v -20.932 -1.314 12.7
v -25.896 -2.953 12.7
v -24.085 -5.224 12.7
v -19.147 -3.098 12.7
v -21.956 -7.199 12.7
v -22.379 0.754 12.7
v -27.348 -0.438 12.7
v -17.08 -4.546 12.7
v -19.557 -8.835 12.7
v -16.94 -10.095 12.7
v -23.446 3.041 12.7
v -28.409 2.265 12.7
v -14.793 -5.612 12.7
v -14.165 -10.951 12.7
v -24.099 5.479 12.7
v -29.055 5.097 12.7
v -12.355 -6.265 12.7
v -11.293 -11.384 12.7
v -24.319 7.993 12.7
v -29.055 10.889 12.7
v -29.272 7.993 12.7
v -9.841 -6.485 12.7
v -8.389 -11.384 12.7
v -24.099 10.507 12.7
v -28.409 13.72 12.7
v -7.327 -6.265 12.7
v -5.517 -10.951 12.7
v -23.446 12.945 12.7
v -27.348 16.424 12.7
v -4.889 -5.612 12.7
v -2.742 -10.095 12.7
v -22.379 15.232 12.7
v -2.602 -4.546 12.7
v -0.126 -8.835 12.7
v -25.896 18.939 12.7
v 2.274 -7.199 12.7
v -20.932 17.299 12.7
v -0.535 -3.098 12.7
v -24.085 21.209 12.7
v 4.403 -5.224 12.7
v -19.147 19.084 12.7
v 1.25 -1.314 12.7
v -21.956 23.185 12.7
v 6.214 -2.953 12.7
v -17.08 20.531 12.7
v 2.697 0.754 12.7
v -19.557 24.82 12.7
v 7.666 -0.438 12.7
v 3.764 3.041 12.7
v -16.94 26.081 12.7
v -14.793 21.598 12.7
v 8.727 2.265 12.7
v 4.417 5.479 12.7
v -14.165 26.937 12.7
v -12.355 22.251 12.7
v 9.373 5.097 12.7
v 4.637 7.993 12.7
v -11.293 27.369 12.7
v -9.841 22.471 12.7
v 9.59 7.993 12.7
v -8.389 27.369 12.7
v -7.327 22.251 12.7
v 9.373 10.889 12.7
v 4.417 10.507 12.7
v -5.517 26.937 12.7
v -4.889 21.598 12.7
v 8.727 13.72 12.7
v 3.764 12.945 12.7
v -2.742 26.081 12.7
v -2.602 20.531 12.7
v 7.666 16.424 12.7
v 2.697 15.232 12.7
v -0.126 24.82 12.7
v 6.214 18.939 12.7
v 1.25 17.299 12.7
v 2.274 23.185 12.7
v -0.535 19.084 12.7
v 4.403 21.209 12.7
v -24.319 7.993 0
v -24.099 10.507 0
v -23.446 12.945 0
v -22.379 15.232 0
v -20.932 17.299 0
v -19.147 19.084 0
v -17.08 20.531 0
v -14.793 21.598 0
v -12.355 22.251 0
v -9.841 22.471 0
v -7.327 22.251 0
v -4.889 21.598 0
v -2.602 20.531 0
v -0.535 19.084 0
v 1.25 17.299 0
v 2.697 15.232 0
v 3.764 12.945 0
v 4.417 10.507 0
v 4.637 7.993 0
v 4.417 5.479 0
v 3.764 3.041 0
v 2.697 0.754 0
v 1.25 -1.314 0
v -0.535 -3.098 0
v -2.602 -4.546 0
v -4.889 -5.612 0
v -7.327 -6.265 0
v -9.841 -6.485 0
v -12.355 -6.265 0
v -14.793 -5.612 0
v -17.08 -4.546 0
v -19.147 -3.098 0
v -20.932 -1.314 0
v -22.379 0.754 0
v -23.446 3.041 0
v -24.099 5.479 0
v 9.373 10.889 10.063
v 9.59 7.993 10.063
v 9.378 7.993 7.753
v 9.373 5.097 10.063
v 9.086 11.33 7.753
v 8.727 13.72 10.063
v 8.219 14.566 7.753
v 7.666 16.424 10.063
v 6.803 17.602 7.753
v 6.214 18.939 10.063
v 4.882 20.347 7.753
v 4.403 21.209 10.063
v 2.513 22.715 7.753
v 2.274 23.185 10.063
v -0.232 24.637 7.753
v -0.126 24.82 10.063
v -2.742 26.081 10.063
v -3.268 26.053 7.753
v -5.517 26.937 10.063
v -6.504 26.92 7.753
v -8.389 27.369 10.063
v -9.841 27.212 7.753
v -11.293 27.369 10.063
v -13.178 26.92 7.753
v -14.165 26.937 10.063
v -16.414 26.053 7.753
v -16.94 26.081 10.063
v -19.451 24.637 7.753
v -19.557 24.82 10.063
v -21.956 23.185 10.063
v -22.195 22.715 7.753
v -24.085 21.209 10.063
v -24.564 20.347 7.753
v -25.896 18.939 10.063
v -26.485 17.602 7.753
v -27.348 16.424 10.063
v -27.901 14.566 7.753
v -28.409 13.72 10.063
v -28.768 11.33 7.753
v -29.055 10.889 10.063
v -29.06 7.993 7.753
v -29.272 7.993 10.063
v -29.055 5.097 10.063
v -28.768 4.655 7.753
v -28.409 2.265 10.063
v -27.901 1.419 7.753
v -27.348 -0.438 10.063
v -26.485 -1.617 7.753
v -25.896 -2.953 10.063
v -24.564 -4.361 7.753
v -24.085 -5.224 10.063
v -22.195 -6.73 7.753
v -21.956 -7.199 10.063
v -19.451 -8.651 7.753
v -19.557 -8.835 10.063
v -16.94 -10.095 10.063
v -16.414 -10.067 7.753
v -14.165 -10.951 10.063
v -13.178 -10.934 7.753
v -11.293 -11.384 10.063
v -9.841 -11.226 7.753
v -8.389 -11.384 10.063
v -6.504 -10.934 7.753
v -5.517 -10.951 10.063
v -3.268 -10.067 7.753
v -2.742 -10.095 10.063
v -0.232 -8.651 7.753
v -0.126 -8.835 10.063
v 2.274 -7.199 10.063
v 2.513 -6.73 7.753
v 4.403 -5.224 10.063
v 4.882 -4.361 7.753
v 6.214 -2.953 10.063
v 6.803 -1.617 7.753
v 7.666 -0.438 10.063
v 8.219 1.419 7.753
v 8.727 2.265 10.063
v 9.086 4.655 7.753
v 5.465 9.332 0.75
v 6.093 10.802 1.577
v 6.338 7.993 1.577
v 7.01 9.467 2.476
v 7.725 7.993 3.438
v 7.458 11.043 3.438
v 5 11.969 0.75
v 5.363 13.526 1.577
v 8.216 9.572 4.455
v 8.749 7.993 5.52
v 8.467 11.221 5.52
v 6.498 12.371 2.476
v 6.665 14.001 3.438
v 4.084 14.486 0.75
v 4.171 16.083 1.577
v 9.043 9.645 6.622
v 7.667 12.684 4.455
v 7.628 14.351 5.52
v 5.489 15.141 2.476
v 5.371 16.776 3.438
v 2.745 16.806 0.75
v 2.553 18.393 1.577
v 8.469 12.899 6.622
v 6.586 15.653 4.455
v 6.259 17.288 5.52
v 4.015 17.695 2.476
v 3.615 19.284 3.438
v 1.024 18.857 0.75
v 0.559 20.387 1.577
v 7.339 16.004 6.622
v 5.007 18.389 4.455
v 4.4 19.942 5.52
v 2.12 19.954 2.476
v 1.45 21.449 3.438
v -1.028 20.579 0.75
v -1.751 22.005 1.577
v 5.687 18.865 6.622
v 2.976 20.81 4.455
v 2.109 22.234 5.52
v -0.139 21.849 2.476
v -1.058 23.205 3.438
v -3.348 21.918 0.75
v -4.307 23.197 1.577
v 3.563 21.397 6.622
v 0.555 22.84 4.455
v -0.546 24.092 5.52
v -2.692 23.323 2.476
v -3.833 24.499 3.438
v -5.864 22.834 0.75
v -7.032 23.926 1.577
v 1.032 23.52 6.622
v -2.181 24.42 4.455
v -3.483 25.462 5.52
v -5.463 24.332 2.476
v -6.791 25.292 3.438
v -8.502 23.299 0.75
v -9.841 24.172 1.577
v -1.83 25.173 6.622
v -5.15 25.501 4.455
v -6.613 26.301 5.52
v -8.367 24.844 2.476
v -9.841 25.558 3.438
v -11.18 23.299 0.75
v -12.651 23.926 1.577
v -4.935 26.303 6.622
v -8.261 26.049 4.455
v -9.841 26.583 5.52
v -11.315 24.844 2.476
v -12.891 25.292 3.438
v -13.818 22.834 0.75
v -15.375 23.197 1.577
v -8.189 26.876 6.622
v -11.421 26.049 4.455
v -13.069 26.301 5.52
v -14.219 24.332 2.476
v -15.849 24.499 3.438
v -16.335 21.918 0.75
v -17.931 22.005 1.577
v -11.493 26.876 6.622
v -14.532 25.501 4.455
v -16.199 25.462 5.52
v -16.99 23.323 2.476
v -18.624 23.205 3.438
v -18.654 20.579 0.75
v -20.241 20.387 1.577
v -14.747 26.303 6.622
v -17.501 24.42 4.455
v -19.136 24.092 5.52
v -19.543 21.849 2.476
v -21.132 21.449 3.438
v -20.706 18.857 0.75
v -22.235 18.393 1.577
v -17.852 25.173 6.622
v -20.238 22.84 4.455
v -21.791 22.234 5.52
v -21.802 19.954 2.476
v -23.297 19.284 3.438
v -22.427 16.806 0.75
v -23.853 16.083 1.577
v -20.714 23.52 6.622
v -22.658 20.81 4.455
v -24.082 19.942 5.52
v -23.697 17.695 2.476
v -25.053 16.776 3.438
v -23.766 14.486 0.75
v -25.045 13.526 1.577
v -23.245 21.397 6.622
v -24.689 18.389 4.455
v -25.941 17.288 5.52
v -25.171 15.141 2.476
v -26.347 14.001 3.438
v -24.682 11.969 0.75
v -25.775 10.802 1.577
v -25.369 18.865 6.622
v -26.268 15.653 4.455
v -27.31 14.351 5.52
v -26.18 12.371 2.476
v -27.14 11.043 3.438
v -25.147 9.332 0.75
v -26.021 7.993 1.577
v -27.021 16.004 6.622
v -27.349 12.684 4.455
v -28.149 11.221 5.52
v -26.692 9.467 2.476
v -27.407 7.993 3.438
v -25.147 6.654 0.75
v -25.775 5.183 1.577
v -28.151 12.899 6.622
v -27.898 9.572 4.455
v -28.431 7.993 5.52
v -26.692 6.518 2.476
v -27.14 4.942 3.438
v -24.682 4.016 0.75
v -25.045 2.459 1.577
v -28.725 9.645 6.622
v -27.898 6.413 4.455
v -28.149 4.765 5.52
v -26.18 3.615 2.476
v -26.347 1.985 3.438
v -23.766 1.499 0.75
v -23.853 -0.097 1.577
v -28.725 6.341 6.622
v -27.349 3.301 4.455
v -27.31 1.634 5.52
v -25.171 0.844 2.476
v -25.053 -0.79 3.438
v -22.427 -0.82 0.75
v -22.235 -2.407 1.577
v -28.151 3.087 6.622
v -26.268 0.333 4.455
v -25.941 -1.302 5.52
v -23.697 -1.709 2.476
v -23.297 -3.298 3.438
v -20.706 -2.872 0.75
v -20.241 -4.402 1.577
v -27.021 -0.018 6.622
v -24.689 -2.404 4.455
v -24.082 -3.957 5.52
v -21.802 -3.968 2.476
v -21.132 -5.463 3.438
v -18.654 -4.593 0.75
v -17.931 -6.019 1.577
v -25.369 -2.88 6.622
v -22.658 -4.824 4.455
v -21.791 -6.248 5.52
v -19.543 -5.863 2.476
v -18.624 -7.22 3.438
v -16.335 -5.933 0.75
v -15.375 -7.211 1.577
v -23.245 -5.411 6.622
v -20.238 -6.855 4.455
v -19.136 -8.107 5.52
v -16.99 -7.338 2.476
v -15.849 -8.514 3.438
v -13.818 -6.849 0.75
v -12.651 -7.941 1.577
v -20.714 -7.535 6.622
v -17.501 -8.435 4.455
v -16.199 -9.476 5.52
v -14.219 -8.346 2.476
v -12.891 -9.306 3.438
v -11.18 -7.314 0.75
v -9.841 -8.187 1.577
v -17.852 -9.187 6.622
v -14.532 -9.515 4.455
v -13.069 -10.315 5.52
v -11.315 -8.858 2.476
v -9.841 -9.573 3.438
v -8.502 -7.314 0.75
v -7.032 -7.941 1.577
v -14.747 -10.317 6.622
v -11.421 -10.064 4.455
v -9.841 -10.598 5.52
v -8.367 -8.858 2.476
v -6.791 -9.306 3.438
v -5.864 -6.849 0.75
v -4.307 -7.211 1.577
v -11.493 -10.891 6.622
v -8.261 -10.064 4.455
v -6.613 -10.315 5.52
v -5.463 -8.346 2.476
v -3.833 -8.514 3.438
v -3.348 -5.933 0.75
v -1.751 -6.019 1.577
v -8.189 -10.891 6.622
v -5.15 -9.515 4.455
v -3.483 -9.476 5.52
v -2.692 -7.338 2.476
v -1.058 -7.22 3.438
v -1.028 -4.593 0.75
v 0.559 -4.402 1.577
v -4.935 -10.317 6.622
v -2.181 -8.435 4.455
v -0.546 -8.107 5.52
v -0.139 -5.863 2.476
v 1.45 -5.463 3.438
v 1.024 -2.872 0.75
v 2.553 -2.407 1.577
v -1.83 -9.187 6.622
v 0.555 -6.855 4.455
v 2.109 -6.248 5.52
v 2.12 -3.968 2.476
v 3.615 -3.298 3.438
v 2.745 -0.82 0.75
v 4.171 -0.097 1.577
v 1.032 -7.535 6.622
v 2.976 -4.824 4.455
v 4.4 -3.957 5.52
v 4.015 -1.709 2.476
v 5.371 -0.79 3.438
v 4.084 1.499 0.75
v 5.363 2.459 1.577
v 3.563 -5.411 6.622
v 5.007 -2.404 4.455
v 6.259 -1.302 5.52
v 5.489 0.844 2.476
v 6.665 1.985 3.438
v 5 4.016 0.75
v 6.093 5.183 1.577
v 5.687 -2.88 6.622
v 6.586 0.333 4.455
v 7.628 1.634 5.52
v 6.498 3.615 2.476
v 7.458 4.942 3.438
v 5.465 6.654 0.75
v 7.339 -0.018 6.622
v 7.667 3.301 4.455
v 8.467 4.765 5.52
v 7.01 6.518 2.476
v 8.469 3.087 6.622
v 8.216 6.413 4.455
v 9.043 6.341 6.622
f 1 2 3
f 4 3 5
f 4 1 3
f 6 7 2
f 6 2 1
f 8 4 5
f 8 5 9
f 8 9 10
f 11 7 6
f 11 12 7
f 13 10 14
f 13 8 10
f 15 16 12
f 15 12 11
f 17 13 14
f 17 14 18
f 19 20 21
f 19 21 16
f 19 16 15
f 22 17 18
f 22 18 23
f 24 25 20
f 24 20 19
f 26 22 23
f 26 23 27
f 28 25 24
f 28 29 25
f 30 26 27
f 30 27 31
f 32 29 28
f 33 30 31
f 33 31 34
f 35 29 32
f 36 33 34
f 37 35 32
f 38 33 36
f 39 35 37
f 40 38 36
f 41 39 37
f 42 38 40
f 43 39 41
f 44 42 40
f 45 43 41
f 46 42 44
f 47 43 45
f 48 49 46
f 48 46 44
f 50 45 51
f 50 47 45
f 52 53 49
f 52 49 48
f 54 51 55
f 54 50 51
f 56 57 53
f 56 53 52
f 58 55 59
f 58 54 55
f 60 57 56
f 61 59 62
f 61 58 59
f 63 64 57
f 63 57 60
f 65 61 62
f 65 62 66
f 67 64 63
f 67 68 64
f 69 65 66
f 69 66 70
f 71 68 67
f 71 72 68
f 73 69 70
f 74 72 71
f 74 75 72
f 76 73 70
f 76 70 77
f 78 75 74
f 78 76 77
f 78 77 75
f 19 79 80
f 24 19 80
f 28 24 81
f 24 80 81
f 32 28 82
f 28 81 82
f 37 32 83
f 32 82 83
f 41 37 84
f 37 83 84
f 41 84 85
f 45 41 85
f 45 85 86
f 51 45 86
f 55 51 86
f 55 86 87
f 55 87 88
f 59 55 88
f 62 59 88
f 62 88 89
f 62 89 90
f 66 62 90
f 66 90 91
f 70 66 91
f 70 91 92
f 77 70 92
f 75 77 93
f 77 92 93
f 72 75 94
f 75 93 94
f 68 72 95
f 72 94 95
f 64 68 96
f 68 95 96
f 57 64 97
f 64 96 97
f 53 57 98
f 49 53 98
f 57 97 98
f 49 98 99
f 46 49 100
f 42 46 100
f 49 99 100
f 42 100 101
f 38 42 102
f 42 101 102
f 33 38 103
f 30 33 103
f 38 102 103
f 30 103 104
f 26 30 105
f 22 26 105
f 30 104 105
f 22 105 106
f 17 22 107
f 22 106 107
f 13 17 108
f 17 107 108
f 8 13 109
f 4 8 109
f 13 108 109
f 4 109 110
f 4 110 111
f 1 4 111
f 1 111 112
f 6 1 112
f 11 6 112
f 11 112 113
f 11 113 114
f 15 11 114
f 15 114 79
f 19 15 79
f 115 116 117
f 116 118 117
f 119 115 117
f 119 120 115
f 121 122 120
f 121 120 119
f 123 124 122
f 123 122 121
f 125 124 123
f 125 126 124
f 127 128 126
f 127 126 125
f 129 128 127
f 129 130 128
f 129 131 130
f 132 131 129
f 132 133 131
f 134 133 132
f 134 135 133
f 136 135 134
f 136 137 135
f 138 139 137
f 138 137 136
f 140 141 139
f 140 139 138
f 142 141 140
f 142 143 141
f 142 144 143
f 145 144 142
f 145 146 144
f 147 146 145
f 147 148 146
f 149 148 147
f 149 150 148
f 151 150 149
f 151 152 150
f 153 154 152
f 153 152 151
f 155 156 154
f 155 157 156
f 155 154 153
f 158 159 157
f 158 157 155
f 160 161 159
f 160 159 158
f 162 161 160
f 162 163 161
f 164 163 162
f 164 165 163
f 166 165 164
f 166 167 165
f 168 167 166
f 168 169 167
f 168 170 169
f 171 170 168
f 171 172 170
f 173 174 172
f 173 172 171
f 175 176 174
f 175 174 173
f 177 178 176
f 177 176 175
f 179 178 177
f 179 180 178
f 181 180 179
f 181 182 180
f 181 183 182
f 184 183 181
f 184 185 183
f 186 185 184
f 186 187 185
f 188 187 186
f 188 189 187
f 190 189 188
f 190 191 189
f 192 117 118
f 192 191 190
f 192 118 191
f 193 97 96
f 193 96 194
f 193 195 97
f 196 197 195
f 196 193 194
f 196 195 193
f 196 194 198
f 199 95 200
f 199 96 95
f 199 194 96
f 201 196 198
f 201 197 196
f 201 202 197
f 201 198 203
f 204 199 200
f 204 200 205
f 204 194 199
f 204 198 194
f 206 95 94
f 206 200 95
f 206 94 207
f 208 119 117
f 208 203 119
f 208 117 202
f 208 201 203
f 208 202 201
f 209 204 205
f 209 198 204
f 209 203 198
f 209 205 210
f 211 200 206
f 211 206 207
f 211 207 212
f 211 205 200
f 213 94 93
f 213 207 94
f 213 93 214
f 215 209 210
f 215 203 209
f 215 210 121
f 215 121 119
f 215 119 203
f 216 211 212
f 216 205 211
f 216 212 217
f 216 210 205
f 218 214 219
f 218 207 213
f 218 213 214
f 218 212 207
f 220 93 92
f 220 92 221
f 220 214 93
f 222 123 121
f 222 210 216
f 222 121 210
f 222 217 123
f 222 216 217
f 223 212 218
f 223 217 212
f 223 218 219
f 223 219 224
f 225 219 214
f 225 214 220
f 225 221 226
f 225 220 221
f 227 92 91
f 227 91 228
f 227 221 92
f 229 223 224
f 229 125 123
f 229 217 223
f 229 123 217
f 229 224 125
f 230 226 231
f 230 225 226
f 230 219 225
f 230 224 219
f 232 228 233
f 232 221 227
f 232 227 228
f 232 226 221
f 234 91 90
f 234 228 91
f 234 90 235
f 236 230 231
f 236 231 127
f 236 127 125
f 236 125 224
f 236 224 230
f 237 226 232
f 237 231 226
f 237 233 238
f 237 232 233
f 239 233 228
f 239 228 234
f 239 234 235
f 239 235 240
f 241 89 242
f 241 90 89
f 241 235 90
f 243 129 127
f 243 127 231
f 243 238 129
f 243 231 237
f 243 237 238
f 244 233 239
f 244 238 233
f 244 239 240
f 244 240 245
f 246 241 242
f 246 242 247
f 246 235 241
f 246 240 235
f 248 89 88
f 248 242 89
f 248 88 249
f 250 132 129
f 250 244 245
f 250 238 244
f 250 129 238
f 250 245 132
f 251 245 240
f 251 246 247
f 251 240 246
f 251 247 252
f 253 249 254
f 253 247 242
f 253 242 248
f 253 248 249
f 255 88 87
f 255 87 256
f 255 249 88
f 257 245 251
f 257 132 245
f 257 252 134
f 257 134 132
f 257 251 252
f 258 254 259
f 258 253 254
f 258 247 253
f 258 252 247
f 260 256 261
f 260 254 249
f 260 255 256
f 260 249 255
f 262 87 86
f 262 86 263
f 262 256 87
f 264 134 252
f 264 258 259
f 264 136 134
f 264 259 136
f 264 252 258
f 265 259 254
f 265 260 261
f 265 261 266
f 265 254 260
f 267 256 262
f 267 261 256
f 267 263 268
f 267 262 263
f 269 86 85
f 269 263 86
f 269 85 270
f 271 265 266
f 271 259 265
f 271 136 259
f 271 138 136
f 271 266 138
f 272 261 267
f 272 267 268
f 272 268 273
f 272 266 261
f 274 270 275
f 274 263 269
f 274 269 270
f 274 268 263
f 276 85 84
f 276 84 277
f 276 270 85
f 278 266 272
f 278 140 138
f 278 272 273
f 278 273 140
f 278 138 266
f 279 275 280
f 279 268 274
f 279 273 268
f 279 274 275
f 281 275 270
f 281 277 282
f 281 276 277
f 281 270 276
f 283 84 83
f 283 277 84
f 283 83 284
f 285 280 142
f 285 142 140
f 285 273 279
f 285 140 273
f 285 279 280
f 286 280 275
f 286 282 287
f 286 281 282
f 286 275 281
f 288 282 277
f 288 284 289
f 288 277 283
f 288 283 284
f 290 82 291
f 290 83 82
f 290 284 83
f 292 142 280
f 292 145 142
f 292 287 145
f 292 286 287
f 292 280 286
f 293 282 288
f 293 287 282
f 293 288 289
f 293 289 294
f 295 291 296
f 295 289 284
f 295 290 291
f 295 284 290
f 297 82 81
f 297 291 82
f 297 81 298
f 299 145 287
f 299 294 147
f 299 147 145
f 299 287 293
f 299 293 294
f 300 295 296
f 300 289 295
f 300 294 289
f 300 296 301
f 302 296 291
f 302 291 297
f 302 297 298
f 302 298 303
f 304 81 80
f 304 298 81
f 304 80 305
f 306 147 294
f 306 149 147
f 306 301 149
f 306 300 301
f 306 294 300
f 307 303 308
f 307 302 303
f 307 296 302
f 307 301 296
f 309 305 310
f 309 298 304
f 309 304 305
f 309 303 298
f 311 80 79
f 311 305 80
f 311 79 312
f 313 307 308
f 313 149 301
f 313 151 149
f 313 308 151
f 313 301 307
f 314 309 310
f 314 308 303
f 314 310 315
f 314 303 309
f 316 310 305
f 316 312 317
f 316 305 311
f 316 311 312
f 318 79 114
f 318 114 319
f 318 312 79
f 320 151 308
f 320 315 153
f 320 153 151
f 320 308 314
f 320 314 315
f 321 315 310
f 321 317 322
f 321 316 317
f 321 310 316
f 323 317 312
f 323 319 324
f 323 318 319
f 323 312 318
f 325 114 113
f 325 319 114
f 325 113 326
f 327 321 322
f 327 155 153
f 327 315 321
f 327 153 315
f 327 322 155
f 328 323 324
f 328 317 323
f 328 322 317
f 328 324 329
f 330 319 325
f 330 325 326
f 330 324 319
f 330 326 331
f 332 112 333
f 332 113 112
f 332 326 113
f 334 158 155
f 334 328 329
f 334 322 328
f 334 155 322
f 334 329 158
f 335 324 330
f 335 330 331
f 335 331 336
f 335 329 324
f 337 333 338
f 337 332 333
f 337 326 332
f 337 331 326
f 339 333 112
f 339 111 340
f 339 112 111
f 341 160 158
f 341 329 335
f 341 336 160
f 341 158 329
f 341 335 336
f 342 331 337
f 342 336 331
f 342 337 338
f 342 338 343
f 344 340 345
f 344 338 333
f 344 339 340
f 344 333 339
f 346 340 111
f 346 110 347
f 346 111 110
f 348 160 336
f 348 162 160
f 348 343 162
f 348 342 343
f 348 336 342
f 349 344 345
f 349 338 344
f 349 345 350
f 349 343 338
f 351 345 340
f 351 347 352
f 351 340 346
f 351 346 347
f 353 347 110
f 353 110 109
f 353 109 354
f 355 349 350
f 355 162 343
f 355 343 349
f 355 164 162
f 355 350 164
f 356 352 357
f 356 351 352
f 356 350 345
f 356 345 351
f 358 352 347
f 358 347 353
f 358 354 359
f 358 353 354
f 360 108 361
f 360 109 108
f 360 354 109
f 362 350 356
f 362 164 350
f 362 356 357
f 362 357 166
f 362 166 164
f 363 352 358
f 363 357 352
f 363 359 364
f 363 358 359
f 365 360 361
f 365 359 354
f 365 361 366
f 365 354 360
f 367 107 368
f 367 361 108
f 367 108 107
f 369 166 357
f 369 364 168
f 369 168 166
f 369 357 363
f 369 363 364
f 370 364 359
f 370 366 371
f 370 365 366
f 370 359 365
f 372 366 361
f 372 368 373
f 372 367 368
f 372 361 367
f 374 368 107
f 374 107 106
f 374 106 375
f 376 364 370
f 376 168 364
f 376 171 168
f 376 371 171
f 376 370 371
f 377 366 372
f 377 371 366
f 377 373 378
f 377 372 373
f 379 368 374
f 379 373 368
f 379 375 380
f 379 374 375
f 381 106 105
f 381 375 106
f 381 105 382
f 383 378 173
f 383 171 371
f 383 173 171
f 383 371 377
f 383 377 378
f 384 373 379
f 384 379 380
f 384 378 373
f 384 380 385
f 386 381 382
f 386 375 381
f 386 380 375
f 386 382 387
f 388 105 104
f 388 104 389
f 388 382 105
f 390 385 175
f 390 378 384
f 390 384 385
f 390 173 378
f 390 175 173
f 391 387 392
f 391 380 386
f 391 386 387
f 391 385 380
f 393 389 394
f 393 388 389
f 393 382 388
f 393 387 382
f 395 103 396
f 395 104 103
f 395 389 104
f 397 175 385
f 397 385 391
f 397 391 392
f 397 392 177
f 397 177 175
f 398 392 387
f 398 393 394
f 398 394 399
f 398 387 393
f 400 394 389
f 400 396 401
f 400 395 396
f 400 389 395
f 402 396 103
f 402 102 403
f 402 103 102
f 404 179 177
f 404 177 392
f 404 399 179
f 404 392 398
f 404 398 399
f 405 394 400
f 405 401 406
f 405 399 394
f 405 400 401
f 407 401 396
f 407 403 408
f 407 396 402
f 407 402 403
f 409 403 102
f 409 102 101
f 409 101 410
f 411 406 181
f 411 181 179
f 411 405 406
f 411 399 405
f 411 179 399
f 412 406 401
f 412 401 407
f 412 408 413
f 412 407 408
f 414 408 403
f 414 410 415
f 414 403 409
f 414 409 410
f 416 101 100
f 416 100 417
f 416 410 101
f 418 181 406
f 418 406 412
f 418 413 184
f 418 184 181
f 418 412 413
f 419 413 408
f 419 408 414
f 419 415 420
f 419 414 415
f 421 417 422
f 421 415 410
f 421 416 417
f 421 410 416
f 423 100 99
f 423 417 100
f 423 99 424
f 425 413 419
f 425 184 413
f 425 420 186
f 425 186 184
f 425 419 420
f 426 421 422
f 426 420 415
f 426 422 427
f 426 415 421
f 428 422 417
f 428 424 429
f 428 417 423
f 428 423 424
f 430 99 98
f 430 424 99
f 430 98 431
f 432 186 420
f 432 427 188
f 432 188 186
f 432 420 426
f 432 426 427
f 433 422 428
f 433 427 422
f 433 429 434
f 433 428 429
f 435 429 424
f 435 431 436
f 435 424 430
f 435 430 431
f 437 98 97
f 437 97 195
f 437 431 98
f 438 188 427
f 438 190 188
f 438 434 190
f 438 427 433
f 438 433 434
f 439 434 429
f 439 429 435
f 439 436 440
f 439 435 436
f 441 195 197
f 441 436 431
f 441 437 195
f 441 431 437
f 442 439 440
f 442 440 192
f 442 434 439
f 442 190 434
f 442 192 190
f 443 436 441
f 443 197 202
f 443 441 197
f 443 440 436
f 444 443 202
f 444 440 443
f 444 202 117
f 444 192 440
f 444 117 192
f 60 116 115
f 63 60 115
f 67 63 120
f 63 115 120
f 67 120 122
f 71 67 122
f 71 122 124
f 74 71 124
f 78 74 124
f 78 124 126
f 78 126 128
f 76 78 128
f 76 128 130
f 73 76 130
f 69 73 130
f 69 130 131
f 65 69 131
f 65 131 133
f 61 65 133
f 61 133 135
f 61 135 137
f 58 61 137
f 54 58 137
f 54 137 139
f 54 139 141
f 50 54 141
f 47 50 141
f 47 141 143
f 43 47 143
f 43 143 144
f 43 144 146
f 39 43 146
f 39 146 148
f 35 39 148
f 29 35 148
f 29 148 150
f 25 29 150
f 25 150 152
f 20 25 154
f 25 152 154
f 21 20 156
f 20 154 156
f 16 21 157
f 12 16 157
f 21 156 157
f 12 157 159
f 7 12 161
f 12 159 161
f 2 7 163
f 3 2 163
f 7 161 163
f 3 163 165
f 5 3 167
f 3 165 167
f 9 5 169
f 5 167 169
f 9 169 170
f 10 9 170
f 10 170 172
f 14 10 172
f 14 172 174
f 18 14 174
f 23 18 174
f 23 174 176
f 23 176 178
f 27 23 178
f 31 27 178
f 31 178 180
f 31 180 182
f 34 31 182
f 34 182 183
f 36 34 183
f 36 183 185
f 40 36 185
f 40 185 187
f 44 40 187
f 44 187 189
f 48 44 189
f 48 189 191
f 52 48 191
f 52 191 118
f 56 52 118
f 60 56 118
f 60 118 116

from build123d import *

# Parameters (mm, degrees)
SKETCH2_R           = 19.431
BOSS_EXTRUDE1_DEPTH = 12.7
SKETCH4_R           = 14.478
CUT_EXTRUDE1_DEPTH  = 12.7
FILLET2_R           = 12.7


with BuildPart() as part:
    # Sketch2 → Boss-Extrude1 (new body)
    with BuildSketch(Plane.XY):
        with Locations((-9.841060776, 7.992739717)):
            Circle(SKETCH2_R)
    extrude(amount=BOSS_EXTRUDE1_DEPTH)

    # Sketch4 → Cut-Extrude1 (cut)
    with BuildSketch(Plane(origin=(0, 0, 0), x_dir=(-1, 0, 0), z_dir=(0, 0, -1))):
        with Locations((9.841060776, 7.992739717)):
            Circle(SKETCH4_R)
    extrude(amount=-CUT_EXTRUDE1_DEPTH, mode=Mode.SUBTRACT)

    # Fillet2
    # the kernel refuses this fillet: 12.7 mm, written as the material it takes off along each edge
    with BuildSketch(Plane(origin=(-9.841060776, 7.992739717, 0), x_dir=(1, 0, 0), z_dir=(0, -1, 0))) as fillet2_piece_1:
        with BuildLine():
            CenterArc((6.731, 10.063497951), FILLET2_R, 307.589502965, 52.410497035)
            Line((14.478, 0), (14.63294, -0.201269959))
            ThreePointArc((14.63294, -0.201269959), (16.9545, -0.254), (19.431, -0.254))
            Line((19.431, -0.254), (19.685, 0))
            Line((19.685, 0), (19.685, 10.063497951))
            Line((19.685, 10.063497951), (19.431, 10.063497951))
        make_face()
    revolve(axis=Axis((-9.841060776, 7.992739717, 0), (0, 0, 1)), mode=Mode.SUBTRACT)


solid = part.part
